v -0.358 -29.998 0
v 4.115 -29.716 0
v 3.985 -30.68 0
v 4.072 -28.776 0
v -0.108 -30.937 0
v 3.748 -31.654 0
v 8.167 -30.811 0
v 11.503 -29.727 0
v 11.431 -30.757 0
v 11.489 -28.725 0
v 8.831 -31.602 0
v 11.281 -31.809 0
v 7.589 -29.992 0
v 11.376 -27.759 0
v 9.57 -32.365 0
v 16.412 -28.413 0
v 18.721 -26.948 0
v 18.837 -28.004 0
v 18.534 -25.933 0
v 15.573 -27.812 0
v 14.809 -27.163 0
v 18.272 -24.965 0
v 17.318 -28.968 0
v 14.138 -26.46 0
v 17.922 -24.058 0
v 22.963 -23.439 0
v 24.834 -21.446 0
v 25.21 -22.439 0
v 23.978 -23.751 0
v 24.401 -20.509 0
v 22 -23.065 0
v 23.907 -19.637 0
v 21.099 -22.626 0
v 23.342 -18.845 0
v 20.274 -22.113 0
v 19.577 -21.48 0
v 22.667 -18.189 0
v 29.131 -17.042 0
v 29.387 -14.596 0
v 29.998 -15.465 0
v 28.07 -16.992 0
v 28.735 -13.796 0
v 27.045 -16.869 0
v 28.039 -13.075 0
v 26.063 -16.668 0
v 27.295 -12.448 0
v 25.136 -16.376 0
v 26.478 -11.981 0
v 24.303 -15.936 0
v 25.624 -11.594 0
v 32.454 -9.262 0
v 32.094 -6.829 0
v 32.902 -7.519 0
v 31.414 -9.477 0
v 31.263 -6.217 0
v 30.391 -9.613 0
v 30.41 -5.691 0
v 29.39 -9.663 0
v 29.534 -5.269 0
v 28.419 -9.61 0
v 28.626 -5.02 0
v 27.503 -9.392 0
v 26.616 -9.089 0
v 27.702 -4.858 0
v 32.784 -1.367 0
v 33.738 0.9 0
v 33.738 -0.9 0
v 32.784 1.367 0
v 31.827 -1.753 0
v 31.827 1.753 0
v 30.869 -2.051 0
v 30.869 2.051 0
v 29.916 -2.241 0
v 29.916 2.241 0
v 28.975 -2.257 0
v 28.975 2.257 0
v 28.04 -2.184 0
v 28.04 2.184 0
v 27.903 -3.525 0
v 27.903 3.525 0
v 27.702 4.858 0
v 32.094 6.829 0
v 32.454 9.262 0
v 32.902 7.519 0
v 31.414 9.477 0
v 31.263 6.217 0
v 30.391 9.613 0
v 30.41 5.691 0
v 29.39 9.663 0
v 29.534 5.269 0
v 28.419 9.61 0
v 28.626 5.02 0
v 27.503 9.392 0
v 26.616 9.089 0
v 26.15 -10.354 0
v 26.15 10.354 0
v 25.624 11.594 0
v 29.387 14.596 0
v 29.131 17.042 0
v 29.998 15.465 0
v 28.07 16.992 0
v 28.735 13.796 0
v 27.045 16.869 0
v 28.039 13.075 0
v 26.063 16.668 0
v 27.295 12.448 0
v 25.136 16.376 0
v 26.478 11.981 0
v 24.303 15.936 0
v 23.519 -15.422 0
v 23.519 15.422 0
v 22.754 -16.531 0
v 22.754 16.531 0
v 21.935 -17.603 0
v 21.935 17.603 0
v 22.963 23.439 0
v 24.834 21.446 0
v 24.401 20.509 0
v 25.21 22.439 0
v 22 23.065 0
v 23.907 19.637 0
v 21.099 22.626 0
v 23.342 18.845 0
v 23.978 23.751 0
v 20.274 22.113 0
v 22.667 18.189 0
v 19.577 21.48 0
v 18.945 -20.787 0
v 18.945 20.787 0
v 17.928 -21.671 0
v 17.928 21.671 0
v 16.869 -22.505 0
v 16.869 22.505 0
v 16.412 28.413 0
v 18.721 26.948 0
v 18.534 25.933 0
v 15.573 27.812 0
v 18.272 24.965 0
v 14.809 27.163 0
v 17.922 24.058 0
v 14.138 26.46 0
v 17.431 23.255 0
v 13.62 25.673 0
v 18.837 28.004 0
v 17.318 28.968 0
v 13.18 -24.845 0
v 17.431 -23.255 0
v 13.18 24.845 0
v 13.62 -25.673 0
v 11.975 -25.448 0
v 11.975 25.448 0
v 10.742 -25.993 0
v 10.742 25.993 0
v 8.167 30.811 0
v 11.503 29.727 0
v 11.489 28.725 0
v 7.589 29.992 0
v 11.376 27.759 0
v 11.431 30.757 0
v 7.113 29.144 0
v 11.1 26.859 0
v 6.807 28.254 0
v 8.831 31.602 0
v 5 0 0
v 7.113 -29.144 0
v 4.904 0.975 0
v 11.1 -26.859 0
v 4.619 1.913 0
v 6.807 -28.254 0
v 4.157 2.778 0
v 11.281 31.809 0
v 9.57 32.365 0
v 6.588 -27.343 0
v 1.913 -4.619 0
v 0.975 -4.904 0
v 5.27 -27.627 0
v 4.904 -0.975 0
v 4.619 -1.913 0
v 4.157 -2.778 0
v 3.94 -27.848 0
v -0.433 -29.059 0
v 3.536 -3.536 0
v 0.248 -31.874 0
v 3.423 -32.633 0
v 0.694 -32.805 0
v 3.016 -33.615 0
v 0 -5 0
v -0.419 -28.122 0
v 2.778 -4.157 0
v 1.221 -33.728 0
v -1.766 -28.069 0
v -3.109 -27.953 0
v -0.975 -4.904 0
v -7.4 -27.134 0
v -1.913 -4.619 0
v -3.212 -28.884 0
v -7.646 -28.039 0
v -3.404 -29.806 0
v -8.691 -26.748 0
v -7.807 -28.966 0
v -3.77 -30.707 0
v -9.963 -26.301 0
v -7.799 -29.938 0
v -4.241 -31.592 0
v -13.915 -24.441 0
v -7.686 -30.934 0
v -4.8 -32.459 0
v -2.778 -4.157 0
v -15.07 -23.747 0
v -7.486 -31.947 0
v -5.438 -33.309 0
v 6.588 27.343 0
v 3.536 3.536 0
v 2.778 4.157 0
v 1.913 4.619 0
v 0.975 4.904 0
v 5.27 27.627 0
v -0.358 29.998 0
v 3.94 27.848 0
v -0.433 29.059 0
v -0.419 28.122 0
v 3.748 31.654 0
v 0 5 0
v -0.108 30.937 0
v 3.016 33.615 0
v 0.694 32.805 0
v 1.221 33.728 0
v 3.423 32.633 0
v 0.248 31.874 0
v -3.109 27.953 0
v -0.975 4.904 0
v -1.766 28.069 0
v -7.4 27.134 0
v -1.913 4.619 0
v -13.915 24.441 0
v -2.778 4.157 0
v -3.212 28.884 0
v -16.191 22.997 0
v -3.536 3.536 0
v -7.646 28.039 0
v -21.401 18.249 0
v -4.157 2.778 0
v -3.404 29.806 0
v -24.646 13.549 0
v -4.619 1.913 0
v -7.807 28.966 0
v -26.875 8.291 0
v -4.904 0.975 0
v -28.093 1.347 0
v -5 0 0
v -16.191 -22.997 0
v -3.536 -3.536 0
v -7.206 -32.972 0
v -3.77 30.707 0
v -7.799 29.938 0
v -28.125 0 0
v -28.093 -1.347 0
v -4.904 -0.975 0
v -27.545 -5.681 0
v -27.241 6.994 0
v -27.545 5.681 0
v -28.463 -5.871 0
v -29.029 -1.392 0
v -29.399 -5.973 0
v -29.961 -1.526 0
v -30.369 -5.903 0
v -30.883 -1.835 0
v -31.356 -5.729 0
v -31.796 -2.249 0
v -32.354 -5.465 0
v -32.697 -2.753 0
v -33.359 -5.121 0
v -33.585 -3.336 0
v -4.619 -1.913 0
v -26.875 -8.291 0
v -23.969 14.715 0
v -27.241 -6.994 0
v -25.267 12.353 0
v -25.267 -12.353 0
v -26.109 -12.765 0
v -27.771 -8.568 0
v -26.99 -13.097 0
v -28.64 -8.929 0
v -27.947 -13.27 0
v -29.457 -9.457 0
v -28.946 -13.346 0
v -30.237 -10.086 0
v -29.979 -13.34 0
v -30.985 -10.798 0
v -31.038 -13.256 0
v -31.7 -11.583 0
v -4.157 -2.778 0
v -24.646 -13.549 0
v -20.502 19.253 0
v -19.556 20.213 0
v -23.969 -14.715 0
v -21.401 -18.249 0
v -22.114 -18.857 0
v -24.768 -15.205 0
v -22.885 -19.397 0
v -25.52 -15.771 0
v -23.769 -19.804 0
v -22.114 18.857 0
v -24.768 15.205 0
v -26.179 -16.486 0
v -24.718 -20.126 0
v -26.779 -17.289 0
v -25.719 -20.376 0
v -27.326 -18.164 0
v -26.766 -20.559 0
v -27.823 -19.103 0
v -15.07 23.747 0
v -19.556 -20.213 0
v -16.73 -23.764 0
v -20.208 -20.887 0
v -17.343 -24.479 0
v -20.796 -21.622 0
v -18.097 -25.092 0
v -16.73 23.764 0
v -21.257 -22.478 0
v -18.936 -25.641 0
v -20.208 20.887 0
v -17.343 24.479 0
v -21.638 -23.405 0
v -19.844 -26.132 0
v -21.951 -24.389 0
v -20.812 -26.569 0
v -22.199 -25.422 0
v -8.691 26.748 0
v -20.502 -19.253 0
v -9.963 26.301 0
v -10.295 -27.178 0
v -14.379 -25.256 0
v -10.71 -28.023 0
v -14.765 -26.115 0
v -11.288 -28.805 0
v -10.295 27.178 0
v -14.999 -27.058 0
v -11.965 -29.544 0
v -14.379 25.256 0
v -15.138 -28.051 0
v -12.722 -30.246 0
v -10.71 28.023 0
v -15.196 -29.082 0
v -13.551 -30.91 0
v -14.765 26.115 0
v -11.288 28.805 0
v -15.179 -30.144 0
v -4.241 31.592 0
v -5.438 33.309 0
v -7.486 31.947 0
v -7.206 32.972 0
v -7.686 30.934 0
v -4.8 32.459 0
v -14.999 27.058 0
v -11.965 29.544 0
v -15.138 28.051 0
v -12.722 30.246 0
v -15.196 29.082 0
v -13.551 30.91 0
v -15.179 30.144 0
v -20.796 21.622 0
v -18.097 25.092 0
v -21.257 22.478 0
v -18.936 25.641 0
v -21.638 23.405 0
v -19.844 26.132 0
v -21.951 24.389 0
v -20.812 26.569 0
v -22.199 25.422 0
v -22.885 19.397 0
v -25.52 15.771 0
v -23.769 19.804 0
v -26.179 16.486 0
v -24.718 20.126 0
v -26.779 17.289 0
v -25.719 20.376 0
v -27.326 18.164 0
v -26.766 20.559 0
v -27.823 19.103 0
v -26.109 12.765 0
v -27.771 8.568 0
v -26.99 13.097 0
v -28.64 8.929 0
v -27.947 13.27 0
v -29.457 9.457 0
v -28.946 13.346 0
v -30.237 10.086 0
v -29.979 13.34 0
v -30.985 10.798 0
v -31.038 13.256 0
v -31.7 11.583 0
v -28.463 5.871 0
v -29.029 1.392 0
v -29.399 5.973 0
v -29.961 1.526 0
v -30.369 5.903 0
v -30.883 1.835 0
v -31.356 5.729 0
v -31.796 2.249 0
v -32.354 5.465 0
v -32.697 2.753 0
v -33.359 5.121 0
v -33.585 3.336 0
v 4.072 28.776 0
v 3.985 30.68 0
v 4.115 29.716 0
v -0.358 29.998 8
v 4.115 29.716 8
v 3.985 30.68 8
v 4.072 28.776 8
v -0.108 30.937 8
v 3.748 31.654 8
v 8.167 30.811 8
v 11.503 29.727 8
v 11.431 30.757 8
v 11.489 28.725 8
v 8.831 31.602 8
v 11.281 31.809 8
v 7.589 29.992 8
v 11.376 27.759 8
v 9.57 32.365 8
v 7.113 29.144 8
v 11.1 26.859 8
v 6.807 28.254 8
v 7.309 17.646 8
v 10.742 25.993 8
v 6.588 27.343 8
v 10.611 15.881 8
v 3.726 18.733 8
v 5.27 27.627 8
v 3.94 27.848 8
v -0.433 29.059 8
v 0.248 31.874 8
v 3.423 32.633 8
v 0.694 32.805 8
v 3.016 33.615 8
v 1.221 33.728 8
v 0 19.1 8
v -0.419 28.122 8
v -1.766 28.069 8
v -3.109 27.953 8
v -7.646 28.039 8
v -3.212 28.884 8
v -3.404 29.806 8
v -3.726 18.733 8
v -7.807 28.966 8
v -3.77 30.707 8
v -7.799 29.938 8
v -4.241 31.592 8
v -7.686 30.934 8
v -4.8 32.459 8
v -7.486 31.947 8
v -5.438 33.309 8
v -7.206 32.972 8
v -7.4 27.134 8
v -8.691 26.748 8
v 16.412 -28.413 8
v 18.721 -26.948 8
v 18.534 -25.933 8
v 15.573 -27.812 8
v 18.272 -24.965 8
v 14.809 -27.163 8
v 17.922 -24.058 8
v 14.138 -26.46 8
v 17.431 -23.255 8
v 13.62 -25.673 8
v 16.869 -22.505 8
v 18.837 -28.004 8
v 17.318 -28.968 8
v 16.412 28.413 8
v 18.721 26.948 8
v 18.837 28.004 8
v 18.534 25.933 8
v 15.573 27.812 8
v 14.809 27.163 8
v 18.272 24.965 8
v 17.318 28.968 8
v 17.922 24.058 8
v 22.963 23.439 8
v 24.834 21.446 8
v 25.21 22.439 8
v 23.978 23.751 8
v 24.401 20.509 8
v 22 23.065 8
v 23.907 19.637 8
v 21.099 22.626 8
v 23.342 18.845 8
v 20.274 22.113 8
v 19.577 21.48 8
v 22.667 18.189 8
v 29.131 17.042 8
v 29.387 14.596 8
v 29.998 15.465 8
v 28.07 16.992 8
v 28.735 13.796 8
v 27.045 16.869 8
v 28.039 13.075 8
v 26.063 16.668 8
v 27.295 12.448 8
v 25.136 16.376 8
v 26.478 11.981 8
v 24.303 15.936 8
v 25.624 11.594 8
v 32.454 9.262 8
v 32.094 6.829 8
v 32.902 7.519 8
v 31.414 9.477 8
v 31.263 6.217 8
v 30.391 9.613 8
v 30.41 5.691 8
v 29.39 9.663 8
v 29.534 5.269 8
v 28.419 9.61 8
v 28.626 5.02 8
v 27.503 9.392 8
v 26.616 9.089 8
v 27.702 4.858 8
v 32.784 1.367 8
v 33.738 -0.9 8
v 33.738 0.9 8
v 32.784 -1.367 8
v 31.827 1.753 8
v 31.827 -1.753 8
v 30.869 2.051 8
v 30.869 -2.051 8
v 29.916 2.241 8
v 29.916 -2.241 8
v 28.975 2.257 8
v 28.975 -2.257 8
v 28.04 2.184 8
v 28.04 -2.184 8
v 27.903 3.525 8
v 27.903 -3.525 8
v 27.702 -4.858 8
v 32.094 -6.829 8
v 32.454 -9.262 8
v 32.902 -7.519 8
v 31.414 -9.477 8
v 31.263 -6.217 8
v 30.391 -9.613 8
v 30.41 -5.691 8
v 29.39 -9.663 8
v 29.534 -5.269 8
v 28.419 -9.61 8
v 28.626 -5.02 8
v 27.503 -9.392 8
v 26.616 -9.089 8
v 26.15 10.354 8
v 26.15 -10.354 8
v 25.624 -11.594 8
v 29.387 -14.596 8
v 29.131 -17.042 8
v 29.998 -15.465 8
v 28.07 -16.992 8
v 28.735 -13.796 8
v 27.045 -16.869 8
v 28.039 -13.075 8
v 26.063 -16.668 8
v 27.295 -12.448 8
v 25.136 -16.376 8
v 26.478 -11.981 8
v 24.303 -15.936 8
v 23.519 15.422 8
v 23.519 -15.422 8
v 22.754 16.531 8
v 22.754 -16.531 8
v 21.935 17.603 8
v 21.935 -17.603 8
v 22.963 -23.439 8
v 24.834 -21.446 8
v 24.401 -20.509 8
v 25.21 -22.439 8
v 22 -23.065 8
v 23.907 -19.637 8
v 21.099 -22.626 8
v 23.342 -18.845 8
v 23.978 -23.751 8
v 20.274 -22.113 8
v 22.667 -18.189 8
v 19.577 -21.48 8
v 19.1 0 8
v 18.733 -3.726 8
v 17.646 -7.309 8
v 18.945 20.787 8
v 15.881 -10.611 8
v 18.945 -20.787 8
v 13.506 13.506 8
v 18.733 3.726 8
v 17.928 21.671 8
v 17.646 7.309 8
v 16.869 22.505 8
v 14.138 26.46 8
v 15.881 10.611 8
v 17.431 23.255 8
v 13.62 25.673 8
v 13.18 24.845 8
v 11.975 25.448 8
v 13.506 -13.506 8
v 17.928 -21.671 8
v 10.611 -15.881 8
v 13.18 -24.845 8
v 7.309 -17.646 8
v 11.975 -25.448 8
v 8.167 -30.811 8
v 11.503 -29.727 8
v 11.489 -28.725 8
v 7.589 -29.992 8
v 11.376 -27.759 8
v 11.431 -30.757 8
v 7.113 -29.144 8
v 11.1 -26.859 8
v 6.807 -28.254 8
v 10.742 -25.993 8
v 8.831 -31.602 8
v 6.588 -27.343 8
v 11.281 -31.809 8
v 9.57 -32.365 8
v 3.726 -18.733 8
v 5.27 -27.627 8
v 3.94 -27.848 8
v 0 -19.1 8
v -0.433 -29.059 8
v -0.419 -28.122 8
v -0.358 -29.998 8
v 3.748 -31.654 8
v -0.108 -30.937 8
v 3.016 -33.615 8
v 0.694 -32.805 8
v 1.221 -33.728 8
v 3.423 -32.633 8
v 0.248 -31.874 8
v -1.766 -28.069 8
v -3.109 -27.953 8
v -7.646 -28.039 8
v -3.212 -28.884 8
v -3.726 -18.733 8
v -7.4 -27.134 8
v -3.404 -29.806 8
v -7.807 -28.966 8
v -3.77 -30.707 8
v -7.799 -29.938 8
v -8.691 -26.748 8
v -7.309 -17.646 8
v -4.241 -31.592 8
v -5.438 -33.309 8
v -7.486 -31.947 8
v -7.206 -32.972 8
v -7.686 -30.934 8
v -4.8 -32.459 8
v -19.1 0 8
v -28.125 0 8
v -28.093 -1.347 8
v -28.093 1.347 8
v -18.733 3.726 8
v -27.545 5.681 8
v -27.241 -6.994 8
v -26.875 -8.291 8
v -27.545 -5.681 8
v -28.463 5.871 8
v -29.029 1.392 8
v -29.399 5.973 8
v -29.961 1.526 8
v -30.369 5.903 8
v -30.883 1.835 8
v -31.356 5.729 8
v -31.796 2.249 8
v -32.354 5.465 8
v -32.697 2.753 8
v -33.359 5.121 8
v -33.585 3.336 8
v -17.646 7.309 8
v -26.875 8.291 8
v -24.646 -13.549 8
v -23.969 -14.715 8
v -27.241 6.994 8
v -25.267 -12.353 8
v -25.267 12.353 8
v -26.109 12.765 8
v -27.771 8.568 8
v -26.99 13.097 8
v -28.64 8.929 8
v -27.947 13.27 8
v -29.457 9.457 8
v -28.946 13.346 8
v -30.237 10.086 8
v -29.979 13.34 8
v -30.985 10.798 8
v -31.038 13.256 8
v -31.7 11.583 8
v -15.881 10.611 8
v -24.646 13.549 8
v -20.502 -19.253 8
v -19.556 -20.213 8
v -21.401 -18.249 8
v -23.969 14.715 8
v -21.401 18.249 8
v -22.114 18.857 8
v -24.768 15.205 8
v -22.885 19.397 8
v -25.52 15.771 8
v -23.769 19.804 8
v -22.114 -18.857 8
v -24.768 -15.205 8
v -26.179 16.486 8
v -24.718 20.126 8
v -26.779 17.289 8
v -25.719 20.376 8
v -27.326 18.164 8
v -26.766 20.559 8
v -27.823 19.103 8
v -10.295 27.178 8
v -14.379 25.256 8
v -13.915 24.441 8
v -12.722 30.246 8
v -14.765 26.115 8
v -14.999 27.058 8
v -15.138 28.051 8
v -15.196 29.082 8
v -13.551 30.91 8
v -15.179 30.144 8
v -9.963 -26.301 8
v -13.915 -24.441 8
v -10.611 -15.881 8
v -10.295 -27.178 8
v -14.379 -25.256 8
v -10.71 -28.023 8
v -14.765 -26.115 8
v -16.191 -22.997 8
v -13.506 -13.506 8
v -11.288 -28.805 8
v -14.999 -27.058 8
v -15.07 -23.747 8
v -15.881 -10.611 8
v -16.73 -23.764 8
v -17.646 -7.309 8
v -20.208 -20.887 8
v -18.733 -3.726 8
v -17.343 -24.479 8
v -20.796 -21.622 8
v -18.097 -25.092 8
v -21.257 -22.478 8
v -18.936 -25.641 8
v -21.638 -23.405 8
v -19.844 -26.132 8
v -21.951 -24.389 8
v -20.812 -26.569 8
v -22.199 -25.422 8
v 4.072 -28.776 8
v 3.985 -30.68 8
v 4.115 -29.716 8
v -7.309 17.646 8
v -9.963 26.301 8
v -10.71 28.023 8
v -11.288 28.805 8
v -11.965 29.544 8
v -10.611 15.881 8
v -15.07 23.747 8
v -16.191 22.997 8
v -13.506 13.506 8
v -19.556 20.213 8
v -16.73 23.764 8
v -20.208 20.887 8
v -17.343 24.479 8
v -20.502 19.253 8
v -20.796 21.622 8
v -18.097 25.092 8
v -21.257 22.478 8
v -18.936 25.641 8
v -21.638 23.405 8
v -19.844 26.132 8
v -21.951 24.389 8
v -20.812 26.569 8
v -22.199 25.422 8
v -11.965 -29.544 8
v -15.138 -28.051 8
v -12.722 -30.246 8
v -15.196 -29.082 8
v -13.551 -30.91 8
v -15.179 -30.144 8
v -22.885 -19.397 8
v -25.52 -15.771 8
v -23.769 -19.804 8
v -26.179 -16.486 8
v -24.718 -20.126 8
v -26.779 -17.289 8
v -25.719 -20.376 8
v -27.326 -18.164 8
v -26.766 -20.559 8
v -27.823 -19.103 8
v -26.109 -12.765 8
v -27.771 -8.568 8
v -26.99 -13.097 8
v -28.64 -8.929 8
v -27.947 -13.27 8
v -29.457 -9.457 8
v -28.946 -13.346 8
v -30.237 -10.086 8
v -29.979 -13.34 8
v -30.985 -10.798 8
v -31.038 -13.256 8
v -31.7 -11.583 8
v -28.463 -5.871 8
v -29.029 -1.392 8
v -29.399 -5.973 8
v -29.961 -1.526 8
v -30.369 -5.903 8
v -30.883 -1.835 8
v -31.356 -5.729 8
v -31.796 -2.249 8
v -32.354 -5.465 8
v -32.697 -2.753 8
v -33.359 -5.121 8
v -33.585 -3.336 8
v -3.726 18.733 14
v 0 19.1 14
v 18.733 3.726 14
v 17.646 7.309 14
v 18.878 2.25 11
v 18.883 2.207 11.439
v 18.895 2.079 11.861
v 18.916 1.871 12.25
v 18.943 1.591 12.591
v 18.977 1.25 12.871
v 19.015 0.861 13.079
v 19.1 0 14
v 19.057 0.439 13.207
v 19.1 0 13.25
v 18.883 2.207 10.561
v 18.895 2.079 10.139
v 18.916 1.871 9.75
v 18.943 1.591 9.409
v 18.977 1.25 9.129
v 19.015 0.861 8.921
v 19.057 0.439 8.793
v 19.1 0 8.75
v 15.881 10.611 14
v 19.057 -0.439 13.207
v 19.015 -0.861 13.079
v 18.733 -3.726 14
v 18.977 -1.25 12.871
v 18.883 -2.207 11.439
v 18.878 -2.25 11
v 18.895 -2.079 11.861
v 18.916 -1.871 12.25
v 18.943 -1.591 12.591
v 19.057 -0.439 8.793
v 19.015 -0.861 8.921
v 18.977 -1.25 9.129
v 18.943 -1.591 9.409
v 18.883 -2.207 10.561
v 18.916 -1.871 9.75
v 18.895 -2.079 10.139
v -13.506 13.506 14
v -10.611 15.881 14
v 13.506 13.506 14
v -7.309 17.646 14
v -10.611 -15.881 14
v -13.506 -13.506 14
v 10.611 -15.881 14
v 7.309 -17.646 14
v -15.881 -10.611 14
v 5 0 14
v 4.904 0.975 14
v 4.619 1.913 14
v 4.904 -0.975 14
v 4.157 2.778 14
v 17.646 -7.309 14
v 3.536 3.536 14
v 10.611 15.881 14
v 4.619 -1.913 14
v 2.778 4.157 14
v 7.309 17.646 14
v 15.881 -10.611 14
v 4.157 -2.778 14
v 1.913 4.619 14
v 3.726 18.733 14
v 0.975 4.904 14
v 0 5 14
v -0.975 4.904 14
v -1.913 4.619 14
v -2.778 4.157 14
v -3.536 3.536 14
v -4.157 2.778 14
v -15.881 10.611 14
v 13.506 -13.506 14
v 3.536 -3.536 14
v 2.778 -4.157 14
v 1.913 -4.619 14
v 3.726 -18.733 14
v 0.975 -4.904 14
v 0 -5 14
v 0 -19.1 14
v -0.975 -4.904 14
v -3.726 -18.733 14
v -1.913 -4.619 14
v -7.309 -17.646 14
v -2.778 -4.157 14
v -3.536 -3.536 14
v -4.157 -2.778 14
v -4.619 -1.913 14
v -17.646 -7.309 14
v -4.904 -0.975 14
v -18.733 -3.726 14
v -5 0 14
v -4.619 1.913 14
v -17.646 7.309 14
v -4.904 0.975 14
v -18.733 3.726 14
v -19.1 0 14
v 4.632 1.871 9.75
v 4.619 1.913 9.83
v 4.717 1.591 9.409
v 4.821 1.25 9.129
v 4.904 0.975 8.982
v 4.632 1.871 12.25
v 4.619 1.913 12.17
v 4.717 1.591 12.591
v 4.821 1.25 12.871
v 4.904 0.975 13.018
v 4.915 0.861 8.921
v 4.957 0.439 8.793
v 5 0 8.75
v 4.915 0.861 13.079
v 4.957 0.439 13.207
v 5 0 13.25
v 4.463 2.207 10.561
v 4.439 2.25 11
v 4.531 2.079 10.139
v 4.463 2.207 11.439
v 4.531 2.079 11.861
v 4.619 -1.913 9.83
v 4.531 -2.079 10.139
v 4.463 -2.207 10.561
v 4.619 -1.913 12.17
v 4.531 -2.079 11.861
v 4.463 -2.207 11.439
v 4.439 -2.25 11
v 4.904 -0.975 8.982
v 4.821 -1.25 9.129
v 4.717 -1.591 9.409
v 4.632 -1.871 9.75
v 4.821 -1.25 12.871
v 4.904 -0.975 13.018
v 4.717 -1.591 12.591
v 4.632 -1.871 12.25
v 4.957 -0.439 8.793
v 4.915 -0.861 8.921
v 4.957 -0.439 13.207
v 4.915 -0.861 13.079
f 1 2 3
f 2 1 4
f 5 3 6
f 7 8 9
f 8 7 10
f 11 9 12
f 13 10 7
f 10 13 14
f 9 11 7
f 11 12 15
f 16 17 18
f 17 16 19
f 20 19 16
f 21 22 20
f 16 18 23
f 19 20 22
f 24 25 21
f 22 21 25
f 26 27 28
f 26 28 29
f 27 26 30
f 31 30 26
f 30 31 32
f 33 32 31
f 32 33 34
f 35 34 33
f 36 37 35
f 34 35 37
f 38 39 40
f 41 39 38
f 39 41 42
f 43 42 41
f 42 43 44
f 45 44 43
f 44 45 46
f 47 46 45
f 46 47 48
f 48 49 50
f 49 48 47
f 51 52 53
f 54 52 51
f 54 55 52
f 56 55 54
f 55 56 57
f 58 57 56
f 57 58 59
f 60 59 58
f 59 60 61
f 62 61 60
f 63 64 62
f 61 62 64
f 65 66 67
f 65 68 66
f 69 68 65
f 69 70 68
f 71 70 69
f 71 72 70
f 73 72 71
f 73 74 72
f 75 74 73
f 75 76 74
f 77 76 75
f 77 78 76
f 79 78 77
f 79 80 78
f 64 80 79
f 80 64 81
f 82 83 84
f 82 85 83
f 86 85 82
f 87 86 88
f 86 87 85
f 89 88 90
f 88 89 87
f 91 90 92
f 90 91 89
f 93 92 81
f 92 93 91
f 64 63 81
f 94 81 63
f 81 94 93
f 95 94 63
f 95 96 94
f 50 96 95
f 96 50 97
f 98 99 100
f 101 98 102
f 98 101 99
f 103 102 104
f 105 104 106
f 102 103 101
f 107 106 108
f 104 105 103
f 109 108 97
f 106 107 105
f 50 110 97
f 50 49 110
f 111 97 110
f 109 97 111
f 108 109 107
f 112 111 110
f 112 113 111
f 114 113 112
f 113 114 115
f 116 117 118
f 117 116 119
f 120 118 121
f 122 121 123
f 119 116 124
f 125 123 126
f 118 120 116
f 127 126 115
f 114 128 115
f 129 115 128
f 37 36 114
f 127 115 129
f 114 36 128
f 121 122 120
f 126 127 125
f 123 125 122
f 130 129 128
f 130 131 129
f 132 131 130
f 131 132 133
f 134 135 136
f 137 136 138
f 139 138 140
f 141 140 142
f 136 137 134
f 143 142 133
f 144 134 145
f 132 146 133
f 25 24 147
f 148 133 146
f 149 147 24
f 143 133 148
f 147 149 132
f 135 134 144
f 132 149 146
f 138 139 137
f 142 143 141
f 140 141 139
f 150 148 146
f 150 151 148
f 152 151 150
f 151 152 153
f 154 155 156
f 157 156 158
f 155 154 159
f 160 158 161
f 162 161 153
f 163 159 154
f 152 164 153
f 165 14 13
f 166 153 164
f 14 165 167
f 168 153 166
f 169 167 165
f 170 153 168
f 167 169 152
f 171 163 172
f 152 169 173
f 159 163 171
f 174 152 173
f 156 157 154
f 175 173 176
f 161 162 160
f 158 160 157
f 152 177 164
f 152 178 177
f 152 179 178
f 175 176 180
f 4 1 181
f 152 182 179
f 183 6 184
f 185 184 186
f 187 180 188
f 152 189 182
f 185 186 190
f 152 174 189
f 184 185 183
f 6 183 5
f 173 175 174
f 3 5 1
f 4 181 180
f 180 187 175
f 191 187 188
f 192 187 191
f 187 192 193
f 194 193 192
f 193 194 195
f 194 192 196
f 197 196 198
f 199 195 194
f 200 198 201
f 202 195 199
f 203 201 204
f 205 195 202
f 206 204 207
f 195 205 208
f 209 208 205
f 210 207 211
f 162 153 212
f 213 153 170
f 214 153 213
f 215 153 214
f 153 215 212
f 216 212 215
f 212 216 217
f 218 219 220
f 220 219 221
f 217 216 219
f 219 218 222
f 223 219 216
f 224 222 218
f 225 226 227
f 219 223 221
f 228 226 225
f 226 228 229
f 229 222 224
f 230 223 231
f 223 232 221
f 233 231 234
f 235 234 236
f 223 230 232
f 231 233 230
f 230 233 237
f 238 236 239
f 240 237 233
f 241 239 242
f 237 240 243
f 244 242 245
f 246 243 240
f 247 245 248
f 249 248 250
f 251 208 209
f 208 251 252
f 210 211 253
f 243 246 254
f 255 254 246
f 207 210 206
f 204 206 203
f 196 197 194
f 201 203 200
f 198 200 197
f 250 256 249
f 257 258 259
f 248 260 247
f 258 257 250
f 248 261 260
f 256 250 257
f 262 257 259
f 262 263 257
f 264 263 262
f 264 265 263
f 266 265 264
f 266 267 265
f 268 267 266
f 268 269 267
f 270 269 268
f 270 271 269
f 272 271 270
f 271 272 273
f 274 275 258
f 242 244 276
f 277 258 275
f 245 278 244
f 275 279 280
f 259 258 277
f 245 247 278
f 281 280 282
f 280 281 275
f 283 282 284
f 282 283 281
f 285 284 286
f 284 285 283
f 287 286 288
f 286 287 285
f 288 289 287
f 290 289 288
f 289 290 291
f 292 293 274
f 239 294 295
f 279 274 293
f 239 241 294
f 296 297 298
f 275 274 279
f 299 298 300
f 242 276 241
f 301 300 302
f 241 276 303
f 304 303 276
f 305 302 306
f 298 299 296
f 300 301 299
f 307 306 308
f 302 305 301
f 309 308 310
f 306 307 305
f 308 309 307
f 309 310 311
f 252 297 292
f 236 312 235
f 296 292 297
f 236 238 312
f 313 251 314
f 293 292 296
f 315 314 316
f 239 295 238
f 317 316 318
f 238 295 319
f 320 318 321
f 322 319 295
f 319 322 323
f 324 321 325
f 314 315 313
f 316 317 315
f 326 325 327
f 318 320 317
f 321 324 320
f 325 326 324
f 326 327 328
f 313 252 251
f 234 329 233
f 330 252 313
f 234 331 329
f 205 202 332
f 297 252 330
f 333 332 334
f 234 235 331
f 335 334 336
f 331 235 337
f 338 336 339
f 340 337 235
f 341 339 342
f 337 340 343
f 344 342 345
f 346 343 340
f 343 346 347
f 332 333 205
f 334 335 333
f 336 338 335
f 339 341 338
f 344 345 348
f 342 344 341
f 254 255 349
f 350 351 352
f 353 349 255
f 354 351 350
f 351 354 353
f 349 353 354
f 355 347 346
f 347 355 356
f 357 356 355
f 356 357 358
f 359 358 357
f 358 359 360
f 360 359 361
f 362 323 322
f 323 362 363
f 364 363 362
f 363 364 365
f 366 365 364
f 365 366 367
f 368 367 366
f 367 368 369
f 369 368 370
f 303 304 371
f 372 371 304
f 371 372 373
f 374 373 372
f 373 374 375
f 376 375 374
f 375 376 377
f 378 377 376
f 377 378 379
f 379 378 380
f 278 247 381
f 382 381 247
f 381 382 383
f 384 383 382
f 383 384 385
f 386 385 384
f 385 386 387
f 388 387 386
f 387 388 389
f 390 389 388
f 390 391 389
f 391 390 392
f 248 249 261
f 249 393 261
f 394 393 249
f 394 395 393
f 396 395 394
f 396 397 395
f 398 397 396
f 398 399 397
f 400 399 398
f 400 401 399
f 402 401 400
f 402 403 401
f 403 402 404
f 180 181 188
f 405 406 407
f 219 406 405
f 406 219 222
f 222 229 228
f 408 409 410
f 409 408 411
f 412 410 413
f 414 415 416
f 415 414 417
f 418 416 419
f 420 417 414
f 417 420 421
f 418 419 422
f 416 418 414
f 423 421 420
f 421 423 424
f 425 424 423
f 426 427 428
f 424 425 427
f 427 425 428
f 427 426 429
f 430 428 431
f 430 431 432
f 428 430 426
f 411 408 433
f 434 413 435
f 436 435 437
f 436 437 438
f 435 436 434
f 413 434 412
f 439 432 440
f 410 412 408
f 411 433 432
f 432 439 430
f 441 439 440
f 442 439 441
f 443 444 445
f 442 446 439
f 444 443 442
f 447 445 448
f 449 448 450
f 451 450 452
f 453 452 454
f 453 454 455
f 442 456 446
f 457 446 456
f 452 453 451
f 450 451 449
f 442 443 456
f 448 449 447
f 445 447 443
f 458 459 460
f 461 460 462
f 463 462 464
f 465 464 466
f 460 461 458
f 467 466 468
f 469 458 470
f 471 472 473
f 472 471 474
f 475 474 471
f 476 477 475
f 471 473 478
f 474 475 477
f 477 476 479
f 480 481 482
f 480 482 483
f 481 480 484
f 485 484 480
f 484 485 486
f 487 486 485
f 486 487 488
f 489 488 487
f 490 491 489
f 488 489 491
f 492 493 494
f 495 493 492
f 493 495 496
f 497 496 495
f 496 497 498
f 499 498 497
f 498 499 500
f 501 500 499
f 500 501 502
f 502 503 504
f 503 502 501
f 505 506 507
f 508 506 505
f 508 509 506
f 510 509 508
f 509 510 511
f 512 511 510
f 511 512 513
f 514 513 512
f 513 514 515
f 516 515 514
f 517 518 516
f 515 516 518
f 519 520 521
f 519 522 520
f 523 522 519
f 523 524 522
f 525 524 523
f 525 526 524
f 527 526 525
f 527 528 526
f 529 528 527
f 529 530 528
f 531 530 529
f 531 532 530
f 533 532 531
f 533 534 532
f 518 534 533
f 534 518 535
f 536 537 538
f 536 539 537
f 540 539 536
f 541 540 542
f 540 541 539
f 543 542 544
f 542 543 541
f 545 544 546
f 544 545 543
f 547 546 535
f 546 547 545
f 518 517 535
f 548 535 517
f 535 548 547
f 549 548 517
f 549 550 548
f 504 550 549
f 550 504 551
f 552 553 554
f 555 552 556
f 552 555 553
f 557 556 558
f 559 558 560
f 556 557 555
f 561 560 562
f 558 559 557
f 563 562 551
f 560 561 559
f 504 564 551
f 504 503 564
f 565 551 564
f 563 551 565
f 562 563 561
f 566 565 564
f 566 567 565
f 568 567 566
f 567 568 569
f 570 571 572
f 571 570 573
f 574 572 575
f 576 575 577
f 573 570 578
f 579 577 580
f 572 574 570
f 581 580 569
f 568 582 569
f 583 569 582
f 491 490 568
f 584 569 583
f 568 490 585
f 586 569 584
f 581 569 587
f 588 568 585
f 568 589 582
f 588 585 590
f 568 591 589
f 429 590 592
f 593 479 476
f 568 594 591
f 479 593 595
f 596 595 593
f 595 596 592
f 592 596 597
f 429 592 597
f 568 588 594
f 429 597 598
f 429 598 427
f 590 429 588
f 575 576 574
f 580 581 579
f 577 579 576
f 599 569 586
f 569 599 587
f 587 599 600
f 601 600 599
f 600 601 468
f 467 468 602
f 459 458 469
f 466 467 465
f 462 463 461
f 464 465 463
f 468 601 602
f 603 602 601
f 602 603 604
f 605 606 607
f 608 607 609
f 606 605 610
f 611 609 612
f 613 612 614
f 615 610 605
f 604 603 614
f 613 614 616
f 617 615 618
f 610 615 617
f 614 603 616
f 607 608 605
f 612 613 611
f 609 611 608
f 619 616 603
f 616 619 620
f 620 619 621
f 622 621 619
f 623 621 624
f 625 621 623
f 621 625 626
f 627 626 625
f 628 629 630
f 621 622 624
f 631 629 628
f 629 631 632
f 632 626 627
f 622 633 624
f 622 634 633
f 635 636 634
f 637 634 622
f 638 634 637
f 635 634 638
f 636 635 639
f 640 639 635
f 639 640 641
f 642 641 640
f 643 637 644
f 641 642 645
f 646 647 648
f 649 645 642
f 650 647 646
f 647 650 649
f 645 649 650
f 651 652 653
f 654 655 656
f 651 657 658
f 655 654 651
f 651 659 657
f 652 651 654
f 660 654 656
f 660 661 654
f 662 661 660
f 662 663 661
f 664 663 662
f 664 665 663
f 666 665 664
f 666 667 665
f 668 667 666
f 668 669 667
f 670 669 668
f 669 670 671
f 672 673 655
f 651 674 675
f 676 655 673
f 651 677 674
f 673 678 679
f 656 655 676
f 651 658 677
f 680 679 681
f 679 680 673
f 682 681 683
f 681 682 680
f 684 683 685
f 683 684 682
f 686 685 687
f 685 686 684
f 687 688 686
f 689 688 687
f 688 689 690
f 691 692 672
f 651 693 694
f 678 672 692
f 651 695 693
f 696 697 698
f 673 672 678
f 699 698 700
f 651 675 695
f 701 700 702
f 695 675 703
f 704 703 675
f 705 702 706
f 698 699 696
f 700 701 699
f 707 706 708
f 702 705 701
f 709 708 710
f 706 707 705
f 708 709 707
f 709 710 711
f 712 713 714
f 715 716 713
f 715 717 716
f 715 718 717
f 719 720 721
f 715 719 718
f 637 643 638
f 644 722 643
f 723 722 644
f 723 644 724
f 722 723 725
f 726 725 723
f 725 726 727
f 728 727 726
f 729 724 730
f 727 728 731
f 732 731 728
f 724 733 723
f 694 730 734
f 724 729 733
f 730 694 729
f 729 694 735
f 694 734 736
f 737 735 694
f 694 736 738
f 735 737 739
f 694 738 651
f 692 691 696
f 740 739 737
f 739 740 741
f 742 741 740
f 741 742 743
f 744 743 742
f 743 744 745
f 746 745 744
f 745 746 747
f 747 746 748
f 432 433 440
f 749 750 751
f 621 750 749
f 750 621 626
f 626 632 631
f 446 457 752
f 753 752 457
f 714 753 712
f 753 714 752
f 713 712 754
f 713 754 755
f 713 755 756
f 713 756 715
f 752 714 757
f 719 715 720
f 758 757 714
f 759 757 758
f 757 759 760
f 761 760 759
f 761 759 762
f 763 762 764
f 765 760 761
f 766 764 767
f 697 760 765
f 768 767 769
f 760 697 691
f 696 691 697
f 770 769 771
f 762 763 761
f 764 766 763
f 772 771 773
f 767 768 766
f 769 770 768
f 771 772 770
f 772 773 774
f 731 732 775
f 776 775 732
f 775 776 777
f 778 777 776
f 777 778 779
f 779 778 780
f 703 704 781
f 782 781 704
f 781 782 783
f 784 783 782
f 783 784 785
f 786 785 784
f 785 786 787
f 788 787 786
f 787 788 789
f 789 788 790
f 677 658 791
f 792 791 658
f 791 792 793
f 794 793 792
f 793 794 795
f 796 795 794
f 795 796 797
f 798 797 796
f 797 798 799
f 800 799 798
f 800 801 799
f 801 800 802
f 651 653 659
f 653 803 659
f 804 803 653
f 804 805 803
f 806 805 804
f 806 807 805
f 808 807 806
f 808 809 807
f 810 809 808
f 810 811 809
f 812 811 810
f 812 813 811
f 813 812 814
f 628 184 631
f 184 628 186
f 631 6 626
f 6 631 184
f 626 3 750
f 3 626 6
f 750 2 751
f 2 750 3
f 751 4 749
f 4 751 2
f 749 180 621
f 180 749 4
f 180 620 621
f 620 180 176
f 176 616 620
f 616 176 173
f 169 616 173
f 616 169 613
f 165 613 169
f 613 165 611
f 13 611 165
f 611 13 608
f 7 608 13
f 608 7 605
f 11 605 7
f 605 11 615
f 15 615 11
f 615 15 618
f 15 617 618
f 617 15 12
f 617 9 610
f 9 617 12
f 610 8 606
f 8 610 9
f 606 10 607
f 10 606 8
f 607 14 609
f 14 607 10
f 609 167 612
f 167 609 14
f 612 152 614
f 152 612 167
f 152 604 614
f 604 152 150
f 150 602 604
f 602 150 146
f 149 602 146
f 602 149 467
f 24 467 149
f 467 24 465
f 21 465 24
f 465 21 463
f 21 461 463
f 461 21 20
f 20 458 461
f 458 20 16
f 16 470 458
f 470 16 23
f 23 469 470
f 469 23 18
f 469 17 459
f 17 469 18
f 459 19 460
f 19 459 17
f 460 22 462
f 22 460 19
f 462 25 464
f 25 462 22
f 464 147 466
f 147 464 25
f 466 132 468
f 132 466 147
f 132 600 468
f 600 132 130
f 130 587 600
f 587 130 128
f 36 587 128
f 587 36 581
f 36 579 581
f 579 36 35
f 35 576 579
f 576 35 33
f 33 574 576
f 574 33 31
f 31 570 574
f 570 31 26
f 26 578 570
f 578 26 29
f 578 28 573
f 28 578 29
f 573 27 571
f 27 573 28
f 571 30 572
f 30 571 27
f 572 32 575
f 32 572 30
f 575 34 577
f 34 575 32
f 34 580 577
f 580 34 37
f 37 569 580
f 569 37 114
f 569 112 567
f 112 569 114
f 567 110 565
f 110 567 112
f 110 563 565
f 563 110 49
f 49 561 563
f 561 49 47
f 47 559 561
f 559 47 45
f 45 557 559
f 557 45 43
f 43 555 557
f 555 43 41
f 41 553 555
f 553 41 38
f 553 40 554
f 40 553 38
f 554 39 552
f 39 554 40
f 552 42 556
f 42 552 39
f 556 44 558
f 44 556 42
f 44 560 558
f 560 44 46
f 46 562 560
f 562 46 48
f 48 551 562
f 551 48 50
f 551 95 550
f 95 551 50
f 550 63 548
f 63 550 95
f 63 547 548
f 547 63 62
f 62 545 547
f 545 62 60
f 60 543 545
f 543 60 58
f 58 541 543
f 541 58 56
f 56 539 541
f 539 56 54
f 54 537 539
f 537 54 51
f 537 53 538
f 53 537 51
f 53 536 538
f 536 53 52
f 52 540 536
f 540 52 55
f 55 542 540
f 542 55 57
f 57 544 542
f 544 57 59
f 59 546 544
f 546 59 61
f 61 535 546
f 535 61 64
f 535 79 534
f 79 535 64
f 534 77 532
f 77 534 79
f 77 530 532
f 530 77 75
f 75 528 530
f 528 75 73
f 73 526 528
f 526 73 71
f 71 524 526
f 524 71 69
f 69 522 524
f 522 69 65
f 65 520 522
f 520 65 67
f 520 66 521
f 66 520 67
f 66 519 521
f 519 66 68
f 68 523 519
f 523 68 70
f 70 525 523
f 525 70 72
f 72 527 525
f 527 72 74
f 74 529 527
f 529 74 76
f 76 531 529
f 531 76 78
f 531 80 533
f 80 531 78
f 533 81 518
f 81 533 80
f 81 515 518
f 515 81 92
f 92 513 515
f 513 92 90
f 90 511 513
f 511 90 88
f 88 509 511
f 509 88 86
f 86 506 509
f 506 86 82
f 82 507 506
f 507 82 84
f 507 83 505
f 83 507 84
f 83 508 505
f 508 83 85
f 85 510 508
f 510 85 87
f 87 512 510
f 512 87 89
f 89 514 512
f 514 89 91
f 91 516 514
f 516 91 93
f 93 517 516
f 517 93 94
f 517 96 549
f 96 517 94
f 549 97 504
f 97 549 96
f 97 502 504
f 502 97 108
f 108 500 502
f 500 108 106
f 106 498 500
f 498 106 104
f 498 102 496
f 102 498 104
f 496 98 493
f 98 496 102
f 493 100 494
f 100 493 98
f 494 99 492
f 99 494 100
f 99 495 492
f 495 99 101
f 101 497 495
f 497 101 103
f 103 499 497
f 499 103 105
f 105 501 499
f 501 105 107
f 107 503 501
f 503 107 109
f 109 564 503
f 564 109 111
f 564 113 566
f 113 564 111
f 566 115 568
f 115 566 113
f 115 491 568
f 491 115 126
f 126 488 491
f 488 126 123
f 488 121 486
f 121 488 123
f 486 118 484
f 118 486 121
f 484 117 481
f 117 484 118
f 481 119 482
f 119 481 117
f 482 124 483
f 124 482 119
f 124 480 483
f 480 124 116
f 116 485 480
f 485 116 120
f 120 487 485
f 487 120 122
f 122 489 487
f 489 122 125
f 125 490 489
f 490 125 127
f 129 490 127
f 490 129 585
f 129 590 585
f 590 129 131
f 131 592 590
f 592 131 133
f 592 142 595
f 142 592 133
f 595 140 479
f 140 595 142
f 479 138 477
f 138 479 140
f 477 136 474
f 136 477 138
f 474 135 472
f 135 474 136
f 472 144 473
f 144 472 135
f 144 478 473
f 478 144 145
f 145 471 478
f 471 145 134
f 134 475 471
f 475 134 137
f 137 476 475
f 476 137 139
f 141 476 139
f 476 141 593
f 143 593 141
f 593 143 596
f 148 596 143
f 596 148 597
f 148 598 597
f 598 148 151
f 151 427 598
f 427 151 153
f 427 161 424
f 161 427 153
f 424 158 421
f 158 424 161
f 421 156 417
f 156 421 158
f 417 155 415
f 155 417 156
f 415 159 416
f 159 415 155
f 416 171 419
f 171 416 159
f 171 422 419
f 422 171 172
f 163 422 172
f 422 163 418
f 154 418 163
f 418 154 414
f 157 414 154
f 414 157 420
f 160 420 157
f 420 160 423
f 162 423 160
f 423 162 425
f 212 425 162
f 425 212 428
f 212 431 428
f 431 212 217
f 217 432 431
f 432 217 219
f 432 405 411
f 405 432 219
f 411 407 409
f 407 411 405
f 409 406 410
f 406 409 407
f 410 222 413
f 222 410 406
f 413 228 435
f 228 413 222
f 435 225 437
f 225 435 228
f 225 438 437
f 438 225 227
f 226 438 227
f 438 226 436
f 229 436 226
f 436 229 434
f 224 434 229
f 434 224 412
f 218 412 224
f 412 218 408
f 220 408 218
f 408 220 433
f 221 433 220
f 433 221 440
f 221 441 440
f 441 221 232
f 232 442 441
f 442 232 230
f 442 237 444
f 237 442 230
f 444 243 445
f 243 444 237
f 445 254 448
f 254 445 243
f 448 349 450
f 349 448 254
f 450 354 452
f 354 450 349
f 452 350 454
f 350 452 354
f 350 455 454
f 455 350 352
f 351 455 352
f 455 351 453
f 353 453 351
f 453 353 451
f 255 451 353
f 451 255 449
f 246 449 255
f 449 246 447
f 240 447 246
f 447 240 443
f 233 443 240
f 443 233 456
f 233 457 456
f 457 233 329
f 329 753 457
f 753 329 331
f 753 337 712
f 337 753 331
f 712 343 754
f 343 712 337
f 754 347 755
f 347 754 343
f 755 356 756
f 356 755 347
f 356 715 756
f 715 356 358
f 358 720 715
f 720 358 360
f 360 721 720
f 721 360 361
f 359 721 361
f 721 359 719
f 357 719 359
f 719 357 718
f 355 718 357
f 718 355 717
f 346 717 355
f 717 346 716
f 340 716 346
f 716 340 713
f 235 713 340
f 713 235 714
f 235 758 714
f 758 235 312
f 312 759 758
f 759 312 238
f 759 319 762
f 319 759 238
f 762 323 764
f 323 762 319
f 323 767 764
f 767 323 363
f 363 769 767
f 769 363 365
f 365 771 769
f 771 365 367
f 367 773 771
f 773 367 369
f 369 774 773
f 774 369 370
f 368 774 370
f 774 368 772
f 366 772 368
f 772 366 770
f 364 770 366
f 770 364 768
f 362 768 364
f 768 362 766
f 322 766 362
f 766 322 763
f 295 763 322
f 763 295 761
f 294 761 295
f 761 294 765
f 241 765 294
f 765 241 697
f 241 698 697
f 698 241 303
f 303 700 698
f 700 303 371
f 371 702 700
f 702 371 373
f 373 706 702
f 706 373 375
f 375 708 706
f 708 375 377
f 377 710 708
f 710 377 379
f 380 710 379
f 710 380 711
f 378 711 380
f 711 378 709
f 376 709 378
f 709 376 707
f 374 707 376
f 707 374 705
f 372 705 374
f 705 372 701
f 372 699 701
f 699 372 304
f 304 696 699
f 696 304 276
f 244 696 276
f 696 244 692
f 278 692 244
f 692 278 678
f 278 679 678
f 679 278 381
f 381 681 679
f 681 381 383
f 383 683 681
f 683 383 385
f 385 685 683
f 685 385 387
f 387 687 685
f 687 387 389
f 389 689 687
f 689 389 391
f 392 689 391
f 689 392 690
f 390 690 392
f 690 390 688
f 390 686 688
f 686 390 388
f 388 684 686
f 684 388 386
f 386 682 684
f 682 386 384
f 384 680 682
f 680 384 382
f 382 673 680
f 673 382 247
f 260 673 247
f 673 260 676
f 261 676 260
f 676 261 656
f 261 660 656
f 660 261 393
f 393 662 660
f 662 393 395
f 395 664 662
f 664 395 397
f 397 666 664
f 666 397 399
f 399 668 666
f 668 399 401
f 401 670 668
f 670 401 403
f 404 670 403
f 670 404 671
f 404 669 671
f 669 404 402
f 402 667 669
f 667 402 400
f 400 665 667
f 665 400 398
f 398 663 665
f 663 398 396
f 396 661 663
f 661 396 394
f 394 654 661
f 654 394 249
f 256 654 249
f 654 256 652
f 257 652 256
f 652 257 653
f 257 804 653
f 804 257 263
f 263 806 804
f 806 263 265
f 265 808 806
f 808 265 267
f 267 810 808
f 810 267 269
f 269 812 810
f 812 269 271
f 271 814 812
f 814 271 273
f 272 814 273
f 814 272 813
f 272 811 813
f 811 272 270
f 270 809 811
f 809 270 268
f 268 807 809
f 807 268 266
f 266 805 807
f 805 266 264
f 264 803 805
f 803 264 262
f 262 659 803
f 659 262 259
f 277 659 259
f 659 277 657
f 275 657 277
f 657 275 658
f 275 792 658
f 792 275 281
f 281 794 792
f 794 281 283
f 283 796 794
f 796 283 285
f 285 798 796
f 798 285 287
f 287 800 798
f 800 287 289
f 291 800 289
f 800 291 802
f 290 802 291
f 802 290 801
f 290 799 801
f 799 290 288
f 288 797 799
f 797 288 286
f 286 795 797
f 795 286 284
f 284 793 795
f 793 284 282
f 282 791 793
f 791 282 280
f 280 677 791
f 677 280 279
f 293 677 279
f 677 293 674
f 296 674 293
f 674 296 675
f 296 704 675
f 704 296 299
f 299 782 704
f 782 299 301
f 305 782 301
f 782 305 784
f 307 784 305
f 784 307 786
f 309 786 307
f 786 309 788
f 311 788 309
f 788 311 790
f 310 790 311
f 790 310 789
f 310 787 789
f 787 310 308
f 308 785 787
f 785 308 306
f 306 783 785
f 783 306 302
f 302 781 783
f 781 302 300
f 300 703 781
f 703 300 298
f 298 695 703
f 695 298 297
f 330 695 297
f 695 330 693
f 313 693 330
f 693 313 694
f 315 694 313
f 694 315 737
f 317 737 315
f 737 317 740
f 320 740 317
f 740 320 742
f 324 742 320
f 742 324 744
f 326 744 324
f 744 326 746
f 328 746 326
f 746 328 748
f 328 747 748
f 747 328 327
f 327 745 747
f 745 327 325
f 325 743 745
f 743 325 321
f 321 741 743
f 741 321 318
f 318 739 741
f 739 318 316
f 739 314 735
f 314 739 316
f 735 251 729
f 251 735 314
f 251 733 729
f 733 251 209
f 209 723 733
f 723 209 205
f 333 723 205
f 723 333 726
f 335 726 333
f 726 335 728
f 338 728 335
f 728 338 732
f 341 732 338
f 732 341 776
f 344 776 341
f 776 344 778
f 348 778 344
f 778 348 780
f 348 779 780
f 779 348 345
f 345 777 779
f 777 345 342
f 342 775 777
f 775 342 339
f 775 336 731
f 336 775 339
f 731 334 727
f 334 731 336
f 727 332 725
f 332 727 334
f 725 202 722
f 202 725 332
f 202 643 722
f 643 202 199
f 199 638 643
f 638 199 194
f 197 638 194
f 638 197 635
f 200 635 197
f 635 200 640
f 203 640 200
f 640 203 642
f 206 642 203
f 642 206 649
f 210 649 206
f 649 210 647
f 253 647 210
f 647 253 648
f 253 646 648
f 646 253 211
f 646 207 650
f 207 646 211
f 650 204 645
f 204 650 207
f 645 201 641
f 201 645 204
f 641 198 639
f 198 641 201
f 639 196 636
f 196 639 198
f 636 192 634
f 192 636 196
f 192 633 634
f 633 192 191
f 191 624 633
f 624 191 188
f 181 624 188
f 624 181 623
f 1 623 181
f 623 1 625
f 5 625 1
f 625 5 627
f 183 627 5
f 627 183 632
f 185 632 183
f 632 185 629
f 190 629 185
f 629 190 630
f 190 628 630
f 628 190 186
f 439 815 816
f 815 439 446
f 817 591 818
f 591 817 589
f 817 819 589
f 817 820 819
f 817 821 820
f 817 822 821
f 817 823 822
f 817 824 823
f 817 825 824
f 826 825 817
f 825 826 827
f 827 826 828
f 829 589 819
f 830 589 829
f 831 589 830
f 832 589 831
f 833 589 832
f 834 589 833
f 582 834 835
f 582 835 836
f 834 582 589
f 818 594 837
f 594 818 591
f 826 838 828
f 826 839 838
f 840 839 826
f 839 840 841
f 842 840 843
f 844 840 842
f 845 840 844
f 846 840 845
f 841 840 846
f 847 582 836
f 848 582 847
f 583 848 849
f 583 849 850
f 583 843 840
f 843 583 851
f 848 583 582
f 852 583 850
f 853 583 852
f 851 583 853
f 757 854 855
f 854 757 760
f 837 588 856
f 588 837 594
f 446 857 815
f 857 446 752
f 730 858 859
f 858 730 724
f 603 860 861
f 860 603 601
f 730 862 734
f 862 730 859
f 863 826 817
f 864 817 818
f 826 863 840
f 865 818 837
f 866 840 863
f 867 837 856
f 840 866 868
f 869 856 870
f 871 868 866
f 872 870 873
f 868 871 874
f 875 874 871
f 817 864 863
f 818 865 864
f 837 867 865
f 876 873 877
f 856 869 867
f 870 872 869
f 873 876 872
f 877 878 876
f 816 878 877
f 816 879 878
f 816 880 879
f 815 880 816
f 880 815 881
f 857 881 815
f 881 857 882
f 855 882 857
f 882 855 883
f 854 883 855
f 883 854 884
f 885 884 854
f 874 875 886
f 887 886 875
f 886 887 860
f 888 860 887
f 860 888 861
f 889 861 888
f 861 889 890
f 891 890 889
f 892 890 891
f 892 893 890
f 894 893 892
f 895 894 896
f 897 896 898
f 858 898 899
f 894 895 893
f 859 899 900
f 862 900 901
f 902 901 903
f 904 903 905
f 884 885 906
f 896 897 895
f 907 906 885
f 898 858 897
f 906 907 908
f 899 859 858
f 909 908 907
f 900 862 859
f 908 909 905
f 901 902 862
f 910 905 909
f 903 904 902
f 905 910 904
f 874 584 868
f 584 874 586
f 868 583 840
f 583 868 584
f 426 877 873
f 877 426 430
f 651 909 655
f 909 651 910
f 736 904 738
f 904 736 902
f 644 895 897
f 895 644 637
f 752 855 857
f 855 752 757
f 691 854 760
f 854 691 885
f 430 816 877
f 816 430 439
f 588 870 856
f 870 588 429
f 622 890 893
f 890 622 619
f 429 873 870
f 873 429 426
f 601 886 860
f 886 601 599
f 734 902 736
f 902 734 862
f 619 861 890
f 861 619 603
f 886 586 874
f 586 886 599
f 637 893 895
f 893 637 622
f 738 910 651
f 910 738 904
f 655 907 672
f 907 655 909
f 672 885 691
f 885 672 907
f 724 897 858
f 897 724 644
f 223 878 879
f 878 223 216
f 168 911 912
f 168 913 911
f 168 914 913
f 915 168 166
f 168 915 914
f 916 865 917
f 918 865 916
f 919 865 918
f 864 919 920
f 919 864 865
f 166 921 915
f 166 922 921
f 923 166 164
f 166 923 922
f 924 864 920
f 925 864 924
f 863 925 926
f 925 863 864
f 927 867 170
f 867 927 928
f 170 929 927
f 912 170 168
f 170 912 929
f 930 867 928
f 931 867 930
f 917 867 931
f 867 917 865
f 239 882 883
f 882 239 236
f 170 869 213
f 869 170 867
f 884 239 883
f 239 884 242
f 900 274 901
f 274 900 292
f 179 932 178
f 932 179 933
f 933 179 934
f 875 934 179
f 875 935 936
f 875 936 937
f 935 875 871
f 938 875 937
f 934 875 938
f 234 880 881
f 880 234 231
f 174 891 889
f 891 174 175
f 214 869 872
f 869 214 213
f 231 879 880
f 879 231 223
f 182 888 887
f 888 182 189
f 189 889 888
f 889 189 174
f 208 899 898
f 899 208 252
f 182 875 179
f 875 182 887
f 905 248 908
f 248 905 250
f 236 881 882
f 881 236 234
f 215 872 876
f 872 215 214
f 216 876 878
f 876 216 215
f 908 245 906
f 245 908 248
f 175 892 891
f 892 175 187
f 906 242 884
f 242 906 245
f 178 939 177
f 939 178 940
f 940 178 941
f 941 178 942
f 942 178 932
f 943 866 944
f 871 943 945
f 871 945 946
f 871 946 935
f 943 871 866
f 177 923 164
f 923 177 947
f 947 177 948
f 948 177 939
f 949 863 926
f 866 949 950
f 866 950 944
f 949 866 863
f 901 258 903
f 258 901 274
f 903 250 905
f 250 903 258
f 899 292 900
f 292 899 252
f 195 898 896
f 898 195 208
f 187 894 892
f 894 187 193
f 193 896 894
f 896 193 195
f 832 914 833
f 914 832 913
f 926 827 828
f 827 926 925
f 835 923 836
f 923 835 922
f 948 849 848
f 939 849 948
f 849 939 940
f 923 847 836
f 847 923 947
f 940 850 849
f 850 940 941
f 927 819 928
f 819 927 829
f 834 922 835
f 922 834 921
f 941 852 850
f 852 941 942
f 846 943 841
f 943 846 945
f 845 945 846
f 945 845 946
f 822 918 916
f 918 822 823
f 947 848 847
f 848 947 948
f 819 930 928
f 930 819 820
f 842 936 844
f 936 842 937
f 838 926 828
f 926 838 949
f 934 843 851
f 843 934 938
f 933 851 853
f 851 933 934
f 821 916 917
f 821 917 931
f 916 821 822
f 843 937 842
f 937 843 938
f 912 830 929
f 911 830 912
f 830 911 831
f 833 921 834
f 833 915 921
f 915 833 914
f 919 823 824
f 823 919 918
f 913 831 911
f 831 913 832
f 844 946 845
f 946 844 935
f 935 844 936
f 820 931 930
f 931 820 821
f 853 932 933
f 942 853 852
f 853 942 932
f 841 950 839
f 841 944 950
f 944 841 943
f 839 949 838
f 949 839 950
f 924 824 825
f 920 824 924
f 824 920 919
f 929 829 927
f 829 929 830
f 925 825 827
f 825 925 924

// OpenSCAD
$fn = 32;

// ----------------------------------------------------------------------
// Spur gear: m=2.5 z=25, 67.5 mm tip diameter x 14 mm
// ----------------------------------------------------------------------

// --- parameters (mm) ---
modul = 2.5;              // module
n_teeth = 25;             // number of teeth
width = 8;                // face width
pa = 20;                  // pressure angle, deg
shaft_d = 10;             // shaft bore
boss_d = 38.2;            // hub diameter
boss_h = 6;               // hub above the face
set_d = 4.5;              // set screw tap hole
set_z = 11;               // set screw height

/* --- involute profile --- */
pitch_r = modul * n_teeth / 2;
base_r = pitch_r * cos(pa);
tip_r = pitch_r + modul;
root_r = pitch_r - 1.25 * modul;
flank_steps = 6;

function inv_deg(a) = (tan(a) - a * PI / 180) * 180 / PI;
function flank_r(i) = root_r + (tip_r - root_r) * i / flank_steps;
function half_angle(r) = 90 / n_teeth + inv_deg(pa) - inv_deg(acos(min(1, base_r / r)));
function tooth_pt(k, i, side) =
    let (r = flank_r(i), a = k * 360 / n_teeth + side * half_angle(r))
    [r * cos(a), r * sin(a)];

module tooth_profile() {
  polygon(points = [
    for (k = [0 : n_teeth - 1])
      each [
        for (i = [0 : flank_steps]) tooth_pt(k, i, -1),
        for (i = [flank_steps : -1 : 0]) tooth_pt(k, i, 1),
        let (ta = (k + 0.5) * 360 / n_teeth)
          [root_r * cos(ta), root_r * sin(ta)]
      ]
  ]);
}

module gear_disc() {
  linear_extrude(height = width) tooth_profile();
}

module hub_boss() {
  translate([0, 0, width - 1]) cylinder(h = boss_h + 1, d = boss_d);
}

difference() {
  union() {
    gear_disc();
    hub_boss();
  }
  translate([0, 0, -1]) cylinder(h = width + boss_h + 3, d = shaft_d);
  /* set screw, drilled radially */
  translate([-1, 0, set_z]) rotate([0, 90, 0]) cylinder(h = boss_d / 2 + 3, d = set_d);
}
